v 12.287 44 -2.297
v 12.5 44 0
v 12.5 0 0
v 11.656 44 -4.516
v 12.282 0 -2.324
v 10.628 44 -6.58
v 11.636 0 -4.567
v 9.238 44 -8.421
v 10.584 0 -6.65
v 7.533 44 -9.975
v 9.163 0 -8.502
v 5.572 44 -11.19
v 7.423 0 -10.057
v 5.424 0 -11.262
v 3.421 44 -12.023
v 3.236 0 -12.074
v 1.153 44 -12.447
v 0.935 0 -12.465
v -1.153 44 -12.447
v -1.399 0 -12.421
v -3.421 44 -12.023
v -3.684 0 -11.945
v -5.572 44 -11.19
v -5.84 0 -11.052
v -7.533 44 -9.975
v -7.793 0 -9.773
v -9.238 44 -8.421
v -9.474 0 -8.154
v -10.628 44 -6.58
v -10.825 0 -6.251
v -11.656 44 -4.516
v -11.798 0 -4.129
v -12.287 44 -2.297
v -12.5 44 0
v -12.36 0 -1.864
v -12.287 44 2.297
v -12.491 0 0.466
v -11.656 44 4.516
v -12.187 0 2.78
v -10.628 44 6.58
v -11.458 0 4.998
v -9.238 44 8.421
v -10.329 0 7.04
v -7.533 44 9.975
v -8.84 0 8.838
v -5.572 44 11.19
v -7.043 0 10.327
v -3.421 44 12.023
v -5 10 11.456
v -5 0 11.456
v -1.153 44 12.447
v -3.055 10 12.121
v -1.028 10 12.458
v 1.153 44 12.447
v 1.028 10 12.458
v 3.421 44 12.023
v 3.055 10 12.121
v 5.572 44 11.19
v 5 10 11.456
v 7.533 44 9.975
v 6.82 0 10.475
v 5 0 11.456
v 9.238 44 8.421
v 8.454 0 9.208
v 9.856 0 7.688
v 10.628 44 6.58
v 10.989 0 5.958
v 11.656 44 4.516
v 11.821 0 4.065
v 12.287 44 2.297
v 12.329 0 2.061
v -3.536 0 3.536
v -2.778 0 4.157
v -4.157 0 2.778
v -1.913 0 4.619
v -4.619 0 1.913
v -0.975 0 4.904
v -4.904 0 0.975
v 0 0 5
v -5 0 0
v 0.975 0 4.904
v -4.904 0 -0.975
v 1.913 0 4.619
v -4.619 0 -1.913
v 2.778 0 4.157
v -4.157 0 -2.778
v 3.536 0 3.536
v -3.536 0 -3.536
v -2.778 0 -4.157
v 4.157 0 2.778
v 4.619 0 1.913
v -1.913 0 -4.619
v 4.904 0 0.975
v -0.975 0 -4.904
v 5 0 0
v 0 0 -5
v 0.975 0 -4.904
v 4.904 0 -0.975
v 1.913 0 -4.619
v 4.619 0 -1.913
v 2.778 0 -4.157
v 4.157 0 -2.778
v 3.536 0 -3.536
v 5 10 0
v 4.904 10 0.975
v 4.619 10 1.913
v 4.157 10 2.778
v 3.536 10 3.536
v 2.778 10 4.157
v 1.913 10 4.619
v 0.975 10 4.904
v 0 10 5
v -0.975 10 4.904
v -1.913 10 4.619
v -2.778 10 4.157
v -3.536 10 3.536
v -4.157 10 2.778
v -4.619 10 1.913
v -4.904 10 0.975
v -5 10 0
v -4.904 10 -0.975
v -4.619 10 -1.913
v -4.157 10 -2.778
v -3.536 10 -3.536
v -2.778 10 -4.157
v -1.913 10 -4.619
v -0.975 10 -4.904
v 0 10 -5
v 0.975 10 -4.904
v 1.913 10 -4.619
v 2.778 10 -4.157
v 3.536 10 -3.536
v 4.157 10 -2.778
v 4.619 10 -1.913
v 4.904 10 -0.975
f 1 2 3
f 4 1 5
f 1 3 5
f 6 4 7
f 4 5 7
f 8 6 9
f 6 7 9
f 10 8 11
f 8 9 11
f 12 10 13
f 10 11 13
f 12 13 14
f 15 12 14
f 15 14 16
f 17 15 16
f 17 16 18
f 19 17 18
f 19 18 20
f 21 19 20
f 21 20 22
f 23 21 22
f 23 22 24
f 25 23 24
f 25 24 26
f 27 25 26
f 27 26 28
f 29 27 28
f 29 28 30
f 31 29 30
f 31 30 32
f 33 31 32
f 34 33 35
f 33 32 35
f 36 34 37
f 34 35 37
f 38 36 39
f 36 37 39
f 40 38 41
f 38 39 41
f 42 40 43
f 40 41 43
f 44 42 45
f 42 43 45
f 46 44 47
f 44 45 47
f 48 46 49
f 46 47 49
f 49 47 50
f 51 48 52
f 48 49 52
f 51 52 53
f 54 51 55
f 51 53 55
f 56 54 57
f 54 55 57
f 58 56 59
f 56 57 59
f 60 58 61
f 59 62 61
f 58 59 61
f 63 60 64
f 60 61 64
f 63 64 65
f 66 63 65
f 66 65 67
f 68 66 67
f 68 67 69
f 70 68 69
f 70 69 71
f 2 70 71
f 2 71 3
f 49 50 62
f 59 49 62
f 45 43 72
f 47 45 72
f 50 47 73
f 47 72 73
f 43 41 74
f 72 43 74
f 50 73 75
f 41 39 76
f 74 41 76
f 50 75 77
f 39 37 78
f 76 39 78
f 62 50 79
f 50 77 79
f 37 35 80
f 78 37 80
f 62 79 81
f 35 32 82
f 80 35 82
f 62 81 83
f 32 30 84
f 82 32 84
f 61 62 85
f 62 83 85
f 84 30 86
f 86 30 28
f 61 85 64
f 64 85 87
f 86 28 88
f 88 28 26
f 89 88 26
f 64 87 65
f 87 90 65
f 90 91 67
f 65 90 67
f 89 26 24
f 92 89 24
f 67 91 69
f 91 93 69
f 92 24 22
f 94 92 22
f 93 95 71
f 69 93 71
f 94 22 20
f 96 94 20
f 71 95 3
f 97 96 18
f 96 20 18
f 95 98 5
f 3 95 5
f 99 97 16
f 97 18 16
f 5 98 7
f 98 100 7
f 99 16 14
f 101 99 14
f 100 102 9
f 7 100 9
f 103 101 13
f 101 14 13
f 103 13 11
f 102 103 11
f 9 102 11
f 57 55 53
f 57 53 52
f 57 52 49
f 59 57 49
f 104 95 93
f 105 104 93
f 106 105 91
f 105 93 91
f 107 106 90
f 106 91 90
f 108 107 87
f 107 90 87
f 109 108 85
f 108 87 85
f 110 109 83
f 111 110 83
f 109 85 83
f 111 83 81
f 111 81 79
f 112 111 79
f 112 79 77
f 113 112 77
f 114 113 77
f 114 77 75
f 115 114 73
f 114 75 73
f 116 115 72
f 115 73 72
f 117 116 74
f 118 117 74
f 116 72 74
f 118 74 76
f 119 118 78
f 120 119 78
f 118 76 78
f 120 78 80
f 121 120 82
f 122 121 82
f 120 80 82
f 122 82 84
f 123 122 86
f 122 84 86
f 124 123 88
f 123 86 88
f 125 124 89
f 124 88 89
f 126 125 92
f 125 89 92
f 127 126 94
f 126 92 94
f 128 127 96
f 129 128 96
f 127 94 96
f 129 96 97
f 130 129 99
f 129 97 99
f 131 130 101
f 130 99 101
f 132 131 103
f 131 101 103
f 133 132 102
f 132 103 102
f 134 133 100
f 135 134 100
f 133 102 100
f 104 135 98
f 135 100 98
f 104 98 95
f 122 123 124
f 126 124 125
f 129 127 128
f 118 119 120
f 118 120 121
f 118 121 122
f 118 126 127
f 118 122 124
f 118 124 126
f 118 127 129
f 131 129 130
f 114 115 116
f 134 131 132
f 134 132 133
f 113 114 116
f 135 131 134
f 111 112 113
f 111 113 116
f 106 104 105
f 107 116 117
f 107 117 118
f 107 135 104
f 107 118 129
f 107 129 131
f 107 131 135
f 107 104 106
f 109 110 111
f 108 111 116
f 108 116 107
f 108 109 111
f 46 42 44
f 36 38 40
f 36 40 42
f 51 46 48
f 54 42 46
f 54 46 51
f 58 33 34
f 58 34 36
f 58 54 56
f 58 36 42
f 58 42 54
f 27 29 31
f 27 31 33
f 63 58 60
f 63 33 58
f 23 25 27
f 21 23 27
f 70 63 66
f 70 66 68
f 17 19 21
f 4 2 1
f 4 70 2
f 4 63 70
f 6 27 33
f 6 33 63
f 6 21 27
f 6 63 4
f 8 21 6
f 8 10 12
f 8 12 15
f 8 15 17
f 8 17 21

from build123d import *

# Parameters (mm, degrees)
SKETCH1_R           = 12.5
BOSS_EXTRUDE1_DEPTH = 44
SKETCH3_R           = 5
CUT_EXTRUDE1_DEPTH  = 10


with BuildPart() as part:
    # Sketch1 → Boss-Extrude1 (new body)
    with BuildSketch(Plane(origin=(0, 0, 0), x_dir=(1, 0, 0), z_dir=(0, 1, 0))):
        Circle(SKETCH1_R)
    extrude(amount=BOSS_EXTRUDE1_DEPTH)

    # Sketch3 → Cut-Extrude1 (cut)
    with BuildSketch(Plane.XZ):
        Circle(SKETCH3_R)
        with BuildLine():
            Line((-5, 11.456439237), (5, 11.456439237))
            ThreePointArc((5, 11.456439237), (0, 12.5), (-5, 11.456439237))
        make_face()
    extrude(amount=-CUT_EXTRUDE1_DEPTH, mode=Mode.SUBTRACT)


solid = part.part
